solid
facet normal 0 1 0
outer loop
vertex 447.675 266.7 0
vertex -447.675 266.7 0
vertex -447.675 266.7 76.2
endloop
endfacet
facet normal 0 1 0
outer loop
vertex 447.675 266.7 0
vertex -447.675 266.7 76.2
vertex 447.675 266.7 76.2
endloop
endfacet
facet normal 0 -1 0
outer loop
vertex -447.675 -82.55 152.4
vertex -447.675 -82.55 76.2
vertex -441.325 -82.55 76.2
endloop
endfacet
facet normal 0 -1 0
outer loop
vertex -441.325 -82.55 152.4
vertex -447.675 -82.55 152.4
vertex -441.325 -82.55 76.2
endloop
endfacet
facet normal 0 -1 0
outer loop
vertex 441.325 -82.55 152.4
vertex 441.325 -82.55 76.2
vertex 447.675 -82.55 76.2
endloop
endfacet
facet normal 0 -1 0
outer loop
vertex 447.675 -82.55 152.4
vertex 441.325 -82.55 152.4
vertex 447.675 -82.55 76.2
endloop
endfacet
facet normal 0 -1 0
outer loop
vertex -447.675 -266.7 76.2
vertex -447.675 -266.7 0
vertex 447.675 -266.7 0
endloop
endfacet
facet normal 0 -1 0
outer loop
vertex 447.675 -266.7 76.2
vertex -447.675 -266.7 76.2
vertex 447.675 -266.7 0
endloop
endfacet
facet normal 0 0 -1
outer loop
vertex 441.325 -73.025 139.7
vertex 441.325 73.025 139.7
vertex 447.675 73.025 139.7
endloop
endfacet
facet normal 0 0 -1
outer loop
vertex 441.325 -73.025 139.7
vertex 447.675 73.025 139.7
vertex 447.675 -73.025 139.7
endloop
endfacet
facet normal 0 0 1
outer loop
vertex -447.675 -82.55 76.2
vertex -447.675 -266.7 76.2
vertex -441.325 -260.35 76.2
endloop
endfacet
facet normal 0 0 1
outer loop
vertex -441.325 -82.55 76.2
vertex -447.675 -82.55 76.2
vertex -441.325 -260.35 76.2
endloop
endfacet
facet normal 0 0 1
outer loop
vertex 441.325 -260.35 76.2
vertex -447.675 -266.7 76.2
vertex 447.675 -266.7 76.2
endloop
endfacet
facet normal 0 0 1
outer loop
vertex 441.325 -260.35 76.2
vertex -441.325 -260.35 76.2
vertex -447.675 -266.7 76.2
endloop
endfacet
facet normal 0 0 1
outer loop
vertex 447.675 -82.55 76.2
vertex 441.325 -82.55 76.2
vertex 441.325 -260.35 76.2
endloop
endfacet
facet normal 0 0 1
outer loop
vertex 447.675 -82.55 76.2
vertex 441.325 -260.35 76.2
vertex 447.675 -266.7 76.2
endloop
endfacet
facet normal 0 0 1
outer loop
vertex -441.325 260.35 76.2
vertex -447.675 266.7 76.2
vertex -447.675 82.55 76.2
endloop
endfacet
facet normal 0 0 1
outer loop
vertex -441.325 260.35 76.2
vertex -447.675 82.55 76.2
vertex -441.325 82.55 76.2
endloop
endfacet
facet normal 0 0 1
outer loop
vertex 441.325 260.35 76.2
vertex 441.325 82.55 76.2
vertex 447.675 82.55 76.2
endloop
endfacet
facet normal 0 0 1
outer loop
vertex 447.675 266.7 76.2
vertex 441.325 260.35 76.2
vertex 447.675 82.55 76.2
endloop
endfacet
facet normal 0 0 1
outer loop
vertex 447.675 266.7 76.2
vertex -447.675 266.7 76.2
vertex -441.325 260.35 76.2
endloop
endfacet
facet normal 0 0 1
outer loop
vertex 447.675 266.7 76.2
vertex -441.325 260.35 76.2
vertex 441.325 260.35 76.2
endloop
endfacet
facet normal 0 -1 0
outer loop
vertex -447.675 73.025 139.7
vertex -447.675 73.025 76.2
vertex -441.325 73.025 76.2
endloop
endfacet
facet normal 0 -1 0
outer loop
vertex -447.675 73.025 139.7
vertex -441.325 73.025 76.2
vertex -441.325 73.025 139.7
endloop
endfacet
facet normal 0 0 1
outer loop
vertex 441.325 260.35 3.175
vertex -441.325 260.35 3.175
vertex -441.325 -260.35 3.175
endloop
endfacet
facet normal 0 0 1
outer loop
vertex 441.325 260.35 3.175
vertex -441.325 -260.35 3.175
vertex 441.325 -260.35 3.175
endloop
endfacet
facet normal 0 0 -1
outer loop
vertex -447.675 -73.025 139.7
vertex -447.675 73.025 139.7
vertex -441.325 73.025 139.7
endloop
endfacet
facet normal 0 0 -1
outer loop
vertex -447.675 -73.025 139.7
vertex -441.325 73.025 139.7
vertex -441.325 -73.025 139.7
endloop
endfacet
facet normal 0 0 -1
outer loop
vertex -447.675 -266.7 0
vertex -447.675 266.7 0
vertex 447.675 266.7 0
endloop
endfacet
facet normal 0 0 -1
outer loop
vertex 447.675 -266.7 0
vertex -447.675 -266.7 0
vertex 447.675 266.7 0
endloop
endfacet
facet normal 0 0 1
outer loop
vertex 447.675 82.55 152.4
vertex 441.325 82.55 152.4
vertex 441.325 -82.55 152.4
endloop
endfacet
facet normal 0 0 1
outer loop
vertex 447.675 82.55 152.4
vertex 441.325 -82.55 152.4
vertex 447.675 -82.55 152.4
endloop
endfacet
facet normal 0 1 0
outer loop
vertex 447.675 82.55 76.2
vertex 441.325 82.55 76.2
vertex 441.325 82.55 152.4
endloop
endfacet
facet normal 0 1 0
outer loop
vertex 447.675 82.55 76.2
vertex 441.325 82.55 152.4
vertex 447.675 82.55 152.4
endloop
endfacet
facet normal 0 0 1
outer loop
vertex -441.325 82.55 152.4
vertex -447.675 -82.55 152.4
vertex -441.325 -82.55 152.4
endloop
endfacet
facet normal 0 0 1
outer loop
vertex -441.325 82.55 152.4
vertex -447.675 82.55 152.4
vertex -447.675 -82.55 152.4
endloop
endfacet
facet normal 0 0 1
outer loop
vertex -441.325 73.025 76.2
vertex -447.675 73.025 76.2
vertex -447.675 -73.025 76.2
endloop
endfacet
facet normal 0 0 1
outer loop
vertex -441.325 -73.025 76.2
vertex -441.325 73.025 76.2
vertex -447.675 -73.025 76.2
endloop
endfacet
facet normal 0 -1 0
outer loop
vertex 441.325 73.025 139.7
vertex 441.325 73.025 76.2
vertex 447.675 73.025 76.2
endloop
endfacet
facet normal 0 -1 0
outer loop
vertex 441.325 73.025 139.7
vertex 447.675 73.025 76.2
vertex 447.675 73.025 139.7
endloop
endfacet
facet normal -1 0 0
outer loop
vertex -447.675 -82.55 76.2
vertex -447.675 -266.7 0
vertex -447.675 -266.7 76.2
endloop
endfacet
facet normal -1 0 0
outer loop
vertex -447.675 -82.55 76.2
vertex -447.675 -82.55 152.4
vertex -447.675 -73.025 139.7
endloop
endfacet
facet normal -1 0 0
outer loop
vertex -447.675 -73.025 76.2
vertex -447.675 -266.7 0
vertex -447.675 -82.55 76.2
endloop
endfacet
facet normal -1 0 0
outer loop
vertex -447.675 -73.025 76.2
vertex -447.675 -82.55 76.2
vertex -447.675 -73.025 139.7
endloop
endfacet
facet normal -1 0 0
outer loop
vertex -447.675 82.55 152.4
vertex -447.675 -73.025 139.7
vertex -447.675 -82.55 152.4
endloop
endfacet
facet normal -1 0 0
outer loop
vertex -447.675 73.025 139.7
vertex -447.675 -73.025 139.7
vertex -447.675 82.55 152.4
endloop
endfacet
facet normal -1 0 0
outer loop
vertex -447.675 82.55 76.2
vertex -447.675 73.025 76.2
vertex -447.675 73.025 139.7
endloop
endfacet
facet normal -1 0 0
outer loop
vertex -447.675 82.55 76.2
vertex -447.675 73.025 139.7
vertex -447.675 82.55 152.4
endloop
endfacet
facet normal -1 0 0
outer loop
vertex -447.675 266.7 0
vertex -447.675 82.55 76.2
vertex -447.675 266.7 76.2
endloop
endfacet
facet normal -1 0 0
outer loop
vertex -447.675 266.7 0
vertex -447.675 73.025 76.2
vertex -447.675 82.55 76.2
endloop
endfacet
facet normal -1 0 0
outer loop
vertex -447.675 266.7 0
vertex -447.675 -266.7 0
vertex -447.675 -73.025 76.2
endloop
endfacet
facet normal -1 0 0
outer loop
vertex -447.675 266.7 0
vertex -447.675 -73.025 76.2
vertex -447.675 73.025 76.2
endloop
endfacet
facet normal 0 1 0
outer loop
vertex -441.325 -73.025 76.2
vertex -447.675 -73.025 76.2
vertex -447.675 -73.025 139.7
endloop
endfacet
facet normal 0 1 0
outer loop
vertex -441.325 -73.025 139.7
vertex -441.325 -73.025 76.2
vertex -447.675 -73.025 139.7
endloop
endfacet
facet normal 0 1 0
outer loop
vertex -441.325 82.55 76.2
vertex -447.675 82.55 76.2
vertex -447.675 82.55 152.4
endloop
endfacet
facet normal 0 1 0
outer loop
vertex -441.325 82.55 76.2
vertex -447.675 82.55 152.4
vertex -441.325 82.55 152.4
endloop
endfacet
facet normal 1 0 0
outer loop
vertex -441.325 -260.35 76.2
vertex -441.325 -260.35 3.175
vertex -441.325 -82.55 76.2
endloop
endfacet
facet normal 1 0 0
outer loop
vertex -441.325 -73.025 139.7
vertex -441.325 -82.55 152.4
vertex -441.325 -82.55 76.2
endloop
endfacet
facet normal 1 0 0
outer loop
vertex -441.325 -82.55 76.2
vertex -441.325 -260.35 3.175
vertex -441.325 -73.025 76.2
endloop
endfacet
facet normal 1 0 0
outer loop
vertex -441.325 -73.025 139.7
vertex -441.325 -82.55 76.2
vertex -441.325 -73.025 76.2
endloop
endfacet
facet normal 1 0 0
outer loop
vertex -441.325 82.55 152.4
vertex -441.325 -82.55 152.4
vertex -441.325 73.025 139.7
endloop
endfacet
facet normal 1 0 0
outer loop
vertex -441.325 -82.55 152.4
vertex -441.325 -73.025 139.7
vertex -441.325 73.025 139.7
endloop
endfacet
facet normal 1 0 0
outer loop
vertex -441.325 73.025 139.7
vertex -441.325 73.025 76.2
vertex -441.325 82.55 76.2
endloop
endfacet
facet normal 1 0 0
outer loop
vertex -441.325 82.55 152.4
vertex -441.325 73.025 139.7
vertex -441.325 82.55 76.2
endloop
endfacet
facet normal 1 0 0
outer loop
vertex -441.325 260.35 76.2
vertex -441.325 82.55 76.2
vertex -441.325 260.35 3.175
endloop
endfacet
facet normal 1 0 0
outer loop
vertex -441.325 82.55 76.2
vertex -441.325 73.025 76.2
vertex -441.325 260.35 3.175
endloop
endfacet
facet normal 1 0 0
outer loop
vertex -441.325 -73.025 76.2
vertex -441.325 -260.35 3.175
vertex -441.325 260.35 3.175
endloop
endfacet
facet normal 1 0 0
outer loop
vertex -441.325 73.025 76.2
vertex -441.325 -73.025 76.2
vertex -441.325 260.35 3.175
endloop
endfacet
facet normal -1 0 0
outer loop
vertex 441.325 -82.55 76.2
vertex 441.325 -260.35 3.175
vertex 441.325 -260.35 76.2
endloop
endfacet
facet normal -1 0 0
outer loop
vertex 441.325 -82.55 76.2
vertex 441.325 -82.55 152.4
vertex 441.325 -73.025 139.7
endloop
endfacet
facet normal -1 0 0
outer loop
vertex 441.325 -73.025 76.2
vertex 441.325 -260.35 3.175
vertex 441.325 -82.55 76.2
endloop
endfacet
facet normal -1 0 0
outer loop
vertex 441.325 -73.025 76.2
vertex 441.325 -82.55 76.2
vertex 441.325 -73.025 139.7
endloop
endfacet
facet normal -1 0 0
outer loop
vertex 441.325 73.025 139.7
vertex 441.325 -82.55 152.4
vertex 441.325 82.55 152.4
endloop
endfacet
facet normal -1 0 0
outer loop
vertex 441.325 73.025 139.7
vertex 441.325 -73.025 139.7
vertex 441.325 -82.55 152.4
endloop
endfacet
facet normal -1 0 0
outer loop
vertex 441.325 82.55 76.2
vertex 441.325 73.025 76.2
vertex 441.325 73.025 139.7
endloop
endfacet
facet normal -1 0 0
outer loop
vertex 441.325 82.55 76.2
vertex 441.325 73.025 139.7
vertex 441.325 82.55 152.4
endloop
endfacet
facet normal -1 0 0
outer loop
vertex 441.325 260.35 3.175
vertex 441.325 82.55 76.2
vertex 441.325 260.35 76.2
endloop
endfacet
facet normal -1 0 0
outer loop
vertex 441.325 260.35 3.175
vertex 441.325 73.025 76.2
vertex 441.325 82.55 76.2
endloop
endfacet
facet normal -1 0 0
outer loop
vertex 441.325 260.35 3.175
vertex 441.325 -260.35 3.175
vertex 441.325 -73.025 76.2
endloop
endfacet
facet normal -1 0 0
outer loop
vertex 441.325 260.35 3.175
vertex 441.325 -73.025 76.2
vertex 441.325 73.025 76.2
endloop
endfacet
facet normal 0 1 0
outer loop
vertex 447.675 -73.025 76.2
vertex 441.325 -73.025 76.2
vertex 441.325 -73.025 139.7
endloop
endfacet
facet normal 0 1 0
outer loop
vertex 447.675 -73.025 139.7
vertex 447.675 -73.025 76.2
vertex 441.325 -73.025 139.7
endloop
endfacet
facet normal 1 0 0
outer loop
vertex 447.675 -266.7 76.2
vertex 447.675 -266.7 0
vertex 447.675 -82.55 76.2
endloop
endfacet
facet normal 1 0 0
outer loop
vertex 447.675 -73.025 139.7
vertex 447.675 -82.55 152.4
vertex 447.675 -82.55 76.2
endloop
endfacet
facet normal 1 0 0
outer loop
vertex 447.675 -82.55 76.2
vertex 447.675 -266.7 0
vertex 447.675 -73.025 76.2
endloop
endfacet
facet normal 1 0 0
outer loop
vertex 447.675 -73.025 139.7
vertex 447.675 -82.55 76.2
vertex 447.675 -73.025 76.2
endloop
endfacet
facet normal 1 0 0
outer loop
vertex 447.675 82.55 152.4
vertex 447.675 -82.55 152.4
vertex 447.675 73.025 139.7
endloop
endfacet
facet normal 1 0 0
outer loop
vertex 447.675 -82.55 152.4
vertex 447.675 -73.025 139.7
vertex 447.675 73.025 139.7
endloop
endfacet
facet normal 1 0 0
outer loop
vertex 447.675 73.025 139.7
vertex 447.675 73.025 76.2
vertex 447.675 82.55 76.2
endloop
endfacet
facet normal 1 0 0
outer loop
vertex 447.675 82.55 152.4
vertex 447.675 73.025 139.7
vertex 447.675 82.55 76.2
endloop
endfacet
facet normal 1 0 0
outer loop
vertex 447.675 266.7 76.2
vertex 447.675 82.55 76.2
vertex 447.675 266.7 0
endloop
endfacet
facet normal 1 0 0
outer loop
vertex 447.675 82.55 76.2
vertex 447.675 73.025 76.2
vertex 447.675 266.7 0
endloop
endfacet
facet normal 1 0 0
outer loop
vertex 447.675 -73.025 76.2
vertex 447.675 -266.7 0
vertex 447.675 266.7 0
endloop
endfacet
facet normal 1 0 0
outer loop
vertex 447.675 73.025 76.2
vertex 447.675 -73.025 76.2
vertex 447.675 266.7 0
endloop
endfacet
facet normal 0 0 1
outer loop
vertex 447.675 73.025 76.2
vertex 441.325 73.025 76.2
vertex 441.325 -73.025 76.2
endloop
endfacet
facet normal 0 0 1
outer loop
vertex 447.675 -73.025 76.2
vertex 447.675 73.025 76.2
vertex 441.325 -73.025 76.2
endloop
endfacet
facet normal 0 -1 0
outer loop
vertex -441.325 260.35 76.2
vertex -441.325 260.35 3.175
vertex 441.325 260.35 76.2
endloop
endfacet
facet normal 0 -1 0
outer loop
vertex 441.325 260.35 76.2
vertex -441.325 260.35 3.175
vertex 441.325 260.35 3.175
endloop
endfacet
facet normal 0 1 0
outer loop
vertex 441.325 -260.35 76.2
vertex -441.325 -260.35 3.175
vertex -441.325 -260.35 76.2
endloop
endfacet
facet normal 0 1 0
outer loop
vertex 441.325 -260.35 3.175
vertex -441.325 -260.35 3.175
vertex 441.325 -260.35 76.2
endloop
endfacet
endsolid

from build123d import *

# Parameters (mm, degrees)
F0_W     = 895.35
F0_H     = 533.4
F0_W_2   = 882.65
F0_H_2   = 520.7
F1_DEPTH = 76.2
F2_DEPTH = 3.175
F3_W     = 6.35
F3_H     = 82.55
F4_DEPTH = 76.2
F5_W     = 146.05
F5_H     = 63.5
F6_DEPTH = 895.351


with BuildPart() as f1:
    # F0 (on Top) → F1 (new body)
    with BuildSketch(Plane.XY):
        Rectangle(F0_W, F0_H)
        Rectangle(F0_W_2, F0_H_2, mode=Mode.SUBTRACT)
    extrude(amount=F1_DEPTH)

    # F0 (on Top) → F2 (join)
    with BuildSketch(Plane.XY):
        Rectangle(F0_W_2, F0_H_2)
    extrude(amount=F2_DEPTH)

    # F3 (on face) → F4 (join)
    with BuildSketch(Plane.XY.offset(76.2)):
        with Locations((-444.5, -41.275)):
            Rectangle(F3_W, F3_H)
        with Locations((-444.5, 41.275)):
            Rectangle(F3_W, F3_H)
        with Locations((444.5, 41.275)):
            Rectangle(F3_W, F3_H)
        with Locations((444.5, -41.275)):
            Rectangle(F3_W, F3_H)
    extrude(amount=F4_DEPTH)

    # F5 (on face) → F6 (cut, through all)
    with BuildSketch(Plane(origin=(-447.675, 0, 0), x_dir=(0, -1, 0), z_dir=(-1, 0, 0))):
        with Locations((0, 107.95)):
            Rectangle(F5_W, F5_H)
    extrude(amount=-F6_DEPTH, mode=Mode.SUBTRACT)


solid = f1.part
